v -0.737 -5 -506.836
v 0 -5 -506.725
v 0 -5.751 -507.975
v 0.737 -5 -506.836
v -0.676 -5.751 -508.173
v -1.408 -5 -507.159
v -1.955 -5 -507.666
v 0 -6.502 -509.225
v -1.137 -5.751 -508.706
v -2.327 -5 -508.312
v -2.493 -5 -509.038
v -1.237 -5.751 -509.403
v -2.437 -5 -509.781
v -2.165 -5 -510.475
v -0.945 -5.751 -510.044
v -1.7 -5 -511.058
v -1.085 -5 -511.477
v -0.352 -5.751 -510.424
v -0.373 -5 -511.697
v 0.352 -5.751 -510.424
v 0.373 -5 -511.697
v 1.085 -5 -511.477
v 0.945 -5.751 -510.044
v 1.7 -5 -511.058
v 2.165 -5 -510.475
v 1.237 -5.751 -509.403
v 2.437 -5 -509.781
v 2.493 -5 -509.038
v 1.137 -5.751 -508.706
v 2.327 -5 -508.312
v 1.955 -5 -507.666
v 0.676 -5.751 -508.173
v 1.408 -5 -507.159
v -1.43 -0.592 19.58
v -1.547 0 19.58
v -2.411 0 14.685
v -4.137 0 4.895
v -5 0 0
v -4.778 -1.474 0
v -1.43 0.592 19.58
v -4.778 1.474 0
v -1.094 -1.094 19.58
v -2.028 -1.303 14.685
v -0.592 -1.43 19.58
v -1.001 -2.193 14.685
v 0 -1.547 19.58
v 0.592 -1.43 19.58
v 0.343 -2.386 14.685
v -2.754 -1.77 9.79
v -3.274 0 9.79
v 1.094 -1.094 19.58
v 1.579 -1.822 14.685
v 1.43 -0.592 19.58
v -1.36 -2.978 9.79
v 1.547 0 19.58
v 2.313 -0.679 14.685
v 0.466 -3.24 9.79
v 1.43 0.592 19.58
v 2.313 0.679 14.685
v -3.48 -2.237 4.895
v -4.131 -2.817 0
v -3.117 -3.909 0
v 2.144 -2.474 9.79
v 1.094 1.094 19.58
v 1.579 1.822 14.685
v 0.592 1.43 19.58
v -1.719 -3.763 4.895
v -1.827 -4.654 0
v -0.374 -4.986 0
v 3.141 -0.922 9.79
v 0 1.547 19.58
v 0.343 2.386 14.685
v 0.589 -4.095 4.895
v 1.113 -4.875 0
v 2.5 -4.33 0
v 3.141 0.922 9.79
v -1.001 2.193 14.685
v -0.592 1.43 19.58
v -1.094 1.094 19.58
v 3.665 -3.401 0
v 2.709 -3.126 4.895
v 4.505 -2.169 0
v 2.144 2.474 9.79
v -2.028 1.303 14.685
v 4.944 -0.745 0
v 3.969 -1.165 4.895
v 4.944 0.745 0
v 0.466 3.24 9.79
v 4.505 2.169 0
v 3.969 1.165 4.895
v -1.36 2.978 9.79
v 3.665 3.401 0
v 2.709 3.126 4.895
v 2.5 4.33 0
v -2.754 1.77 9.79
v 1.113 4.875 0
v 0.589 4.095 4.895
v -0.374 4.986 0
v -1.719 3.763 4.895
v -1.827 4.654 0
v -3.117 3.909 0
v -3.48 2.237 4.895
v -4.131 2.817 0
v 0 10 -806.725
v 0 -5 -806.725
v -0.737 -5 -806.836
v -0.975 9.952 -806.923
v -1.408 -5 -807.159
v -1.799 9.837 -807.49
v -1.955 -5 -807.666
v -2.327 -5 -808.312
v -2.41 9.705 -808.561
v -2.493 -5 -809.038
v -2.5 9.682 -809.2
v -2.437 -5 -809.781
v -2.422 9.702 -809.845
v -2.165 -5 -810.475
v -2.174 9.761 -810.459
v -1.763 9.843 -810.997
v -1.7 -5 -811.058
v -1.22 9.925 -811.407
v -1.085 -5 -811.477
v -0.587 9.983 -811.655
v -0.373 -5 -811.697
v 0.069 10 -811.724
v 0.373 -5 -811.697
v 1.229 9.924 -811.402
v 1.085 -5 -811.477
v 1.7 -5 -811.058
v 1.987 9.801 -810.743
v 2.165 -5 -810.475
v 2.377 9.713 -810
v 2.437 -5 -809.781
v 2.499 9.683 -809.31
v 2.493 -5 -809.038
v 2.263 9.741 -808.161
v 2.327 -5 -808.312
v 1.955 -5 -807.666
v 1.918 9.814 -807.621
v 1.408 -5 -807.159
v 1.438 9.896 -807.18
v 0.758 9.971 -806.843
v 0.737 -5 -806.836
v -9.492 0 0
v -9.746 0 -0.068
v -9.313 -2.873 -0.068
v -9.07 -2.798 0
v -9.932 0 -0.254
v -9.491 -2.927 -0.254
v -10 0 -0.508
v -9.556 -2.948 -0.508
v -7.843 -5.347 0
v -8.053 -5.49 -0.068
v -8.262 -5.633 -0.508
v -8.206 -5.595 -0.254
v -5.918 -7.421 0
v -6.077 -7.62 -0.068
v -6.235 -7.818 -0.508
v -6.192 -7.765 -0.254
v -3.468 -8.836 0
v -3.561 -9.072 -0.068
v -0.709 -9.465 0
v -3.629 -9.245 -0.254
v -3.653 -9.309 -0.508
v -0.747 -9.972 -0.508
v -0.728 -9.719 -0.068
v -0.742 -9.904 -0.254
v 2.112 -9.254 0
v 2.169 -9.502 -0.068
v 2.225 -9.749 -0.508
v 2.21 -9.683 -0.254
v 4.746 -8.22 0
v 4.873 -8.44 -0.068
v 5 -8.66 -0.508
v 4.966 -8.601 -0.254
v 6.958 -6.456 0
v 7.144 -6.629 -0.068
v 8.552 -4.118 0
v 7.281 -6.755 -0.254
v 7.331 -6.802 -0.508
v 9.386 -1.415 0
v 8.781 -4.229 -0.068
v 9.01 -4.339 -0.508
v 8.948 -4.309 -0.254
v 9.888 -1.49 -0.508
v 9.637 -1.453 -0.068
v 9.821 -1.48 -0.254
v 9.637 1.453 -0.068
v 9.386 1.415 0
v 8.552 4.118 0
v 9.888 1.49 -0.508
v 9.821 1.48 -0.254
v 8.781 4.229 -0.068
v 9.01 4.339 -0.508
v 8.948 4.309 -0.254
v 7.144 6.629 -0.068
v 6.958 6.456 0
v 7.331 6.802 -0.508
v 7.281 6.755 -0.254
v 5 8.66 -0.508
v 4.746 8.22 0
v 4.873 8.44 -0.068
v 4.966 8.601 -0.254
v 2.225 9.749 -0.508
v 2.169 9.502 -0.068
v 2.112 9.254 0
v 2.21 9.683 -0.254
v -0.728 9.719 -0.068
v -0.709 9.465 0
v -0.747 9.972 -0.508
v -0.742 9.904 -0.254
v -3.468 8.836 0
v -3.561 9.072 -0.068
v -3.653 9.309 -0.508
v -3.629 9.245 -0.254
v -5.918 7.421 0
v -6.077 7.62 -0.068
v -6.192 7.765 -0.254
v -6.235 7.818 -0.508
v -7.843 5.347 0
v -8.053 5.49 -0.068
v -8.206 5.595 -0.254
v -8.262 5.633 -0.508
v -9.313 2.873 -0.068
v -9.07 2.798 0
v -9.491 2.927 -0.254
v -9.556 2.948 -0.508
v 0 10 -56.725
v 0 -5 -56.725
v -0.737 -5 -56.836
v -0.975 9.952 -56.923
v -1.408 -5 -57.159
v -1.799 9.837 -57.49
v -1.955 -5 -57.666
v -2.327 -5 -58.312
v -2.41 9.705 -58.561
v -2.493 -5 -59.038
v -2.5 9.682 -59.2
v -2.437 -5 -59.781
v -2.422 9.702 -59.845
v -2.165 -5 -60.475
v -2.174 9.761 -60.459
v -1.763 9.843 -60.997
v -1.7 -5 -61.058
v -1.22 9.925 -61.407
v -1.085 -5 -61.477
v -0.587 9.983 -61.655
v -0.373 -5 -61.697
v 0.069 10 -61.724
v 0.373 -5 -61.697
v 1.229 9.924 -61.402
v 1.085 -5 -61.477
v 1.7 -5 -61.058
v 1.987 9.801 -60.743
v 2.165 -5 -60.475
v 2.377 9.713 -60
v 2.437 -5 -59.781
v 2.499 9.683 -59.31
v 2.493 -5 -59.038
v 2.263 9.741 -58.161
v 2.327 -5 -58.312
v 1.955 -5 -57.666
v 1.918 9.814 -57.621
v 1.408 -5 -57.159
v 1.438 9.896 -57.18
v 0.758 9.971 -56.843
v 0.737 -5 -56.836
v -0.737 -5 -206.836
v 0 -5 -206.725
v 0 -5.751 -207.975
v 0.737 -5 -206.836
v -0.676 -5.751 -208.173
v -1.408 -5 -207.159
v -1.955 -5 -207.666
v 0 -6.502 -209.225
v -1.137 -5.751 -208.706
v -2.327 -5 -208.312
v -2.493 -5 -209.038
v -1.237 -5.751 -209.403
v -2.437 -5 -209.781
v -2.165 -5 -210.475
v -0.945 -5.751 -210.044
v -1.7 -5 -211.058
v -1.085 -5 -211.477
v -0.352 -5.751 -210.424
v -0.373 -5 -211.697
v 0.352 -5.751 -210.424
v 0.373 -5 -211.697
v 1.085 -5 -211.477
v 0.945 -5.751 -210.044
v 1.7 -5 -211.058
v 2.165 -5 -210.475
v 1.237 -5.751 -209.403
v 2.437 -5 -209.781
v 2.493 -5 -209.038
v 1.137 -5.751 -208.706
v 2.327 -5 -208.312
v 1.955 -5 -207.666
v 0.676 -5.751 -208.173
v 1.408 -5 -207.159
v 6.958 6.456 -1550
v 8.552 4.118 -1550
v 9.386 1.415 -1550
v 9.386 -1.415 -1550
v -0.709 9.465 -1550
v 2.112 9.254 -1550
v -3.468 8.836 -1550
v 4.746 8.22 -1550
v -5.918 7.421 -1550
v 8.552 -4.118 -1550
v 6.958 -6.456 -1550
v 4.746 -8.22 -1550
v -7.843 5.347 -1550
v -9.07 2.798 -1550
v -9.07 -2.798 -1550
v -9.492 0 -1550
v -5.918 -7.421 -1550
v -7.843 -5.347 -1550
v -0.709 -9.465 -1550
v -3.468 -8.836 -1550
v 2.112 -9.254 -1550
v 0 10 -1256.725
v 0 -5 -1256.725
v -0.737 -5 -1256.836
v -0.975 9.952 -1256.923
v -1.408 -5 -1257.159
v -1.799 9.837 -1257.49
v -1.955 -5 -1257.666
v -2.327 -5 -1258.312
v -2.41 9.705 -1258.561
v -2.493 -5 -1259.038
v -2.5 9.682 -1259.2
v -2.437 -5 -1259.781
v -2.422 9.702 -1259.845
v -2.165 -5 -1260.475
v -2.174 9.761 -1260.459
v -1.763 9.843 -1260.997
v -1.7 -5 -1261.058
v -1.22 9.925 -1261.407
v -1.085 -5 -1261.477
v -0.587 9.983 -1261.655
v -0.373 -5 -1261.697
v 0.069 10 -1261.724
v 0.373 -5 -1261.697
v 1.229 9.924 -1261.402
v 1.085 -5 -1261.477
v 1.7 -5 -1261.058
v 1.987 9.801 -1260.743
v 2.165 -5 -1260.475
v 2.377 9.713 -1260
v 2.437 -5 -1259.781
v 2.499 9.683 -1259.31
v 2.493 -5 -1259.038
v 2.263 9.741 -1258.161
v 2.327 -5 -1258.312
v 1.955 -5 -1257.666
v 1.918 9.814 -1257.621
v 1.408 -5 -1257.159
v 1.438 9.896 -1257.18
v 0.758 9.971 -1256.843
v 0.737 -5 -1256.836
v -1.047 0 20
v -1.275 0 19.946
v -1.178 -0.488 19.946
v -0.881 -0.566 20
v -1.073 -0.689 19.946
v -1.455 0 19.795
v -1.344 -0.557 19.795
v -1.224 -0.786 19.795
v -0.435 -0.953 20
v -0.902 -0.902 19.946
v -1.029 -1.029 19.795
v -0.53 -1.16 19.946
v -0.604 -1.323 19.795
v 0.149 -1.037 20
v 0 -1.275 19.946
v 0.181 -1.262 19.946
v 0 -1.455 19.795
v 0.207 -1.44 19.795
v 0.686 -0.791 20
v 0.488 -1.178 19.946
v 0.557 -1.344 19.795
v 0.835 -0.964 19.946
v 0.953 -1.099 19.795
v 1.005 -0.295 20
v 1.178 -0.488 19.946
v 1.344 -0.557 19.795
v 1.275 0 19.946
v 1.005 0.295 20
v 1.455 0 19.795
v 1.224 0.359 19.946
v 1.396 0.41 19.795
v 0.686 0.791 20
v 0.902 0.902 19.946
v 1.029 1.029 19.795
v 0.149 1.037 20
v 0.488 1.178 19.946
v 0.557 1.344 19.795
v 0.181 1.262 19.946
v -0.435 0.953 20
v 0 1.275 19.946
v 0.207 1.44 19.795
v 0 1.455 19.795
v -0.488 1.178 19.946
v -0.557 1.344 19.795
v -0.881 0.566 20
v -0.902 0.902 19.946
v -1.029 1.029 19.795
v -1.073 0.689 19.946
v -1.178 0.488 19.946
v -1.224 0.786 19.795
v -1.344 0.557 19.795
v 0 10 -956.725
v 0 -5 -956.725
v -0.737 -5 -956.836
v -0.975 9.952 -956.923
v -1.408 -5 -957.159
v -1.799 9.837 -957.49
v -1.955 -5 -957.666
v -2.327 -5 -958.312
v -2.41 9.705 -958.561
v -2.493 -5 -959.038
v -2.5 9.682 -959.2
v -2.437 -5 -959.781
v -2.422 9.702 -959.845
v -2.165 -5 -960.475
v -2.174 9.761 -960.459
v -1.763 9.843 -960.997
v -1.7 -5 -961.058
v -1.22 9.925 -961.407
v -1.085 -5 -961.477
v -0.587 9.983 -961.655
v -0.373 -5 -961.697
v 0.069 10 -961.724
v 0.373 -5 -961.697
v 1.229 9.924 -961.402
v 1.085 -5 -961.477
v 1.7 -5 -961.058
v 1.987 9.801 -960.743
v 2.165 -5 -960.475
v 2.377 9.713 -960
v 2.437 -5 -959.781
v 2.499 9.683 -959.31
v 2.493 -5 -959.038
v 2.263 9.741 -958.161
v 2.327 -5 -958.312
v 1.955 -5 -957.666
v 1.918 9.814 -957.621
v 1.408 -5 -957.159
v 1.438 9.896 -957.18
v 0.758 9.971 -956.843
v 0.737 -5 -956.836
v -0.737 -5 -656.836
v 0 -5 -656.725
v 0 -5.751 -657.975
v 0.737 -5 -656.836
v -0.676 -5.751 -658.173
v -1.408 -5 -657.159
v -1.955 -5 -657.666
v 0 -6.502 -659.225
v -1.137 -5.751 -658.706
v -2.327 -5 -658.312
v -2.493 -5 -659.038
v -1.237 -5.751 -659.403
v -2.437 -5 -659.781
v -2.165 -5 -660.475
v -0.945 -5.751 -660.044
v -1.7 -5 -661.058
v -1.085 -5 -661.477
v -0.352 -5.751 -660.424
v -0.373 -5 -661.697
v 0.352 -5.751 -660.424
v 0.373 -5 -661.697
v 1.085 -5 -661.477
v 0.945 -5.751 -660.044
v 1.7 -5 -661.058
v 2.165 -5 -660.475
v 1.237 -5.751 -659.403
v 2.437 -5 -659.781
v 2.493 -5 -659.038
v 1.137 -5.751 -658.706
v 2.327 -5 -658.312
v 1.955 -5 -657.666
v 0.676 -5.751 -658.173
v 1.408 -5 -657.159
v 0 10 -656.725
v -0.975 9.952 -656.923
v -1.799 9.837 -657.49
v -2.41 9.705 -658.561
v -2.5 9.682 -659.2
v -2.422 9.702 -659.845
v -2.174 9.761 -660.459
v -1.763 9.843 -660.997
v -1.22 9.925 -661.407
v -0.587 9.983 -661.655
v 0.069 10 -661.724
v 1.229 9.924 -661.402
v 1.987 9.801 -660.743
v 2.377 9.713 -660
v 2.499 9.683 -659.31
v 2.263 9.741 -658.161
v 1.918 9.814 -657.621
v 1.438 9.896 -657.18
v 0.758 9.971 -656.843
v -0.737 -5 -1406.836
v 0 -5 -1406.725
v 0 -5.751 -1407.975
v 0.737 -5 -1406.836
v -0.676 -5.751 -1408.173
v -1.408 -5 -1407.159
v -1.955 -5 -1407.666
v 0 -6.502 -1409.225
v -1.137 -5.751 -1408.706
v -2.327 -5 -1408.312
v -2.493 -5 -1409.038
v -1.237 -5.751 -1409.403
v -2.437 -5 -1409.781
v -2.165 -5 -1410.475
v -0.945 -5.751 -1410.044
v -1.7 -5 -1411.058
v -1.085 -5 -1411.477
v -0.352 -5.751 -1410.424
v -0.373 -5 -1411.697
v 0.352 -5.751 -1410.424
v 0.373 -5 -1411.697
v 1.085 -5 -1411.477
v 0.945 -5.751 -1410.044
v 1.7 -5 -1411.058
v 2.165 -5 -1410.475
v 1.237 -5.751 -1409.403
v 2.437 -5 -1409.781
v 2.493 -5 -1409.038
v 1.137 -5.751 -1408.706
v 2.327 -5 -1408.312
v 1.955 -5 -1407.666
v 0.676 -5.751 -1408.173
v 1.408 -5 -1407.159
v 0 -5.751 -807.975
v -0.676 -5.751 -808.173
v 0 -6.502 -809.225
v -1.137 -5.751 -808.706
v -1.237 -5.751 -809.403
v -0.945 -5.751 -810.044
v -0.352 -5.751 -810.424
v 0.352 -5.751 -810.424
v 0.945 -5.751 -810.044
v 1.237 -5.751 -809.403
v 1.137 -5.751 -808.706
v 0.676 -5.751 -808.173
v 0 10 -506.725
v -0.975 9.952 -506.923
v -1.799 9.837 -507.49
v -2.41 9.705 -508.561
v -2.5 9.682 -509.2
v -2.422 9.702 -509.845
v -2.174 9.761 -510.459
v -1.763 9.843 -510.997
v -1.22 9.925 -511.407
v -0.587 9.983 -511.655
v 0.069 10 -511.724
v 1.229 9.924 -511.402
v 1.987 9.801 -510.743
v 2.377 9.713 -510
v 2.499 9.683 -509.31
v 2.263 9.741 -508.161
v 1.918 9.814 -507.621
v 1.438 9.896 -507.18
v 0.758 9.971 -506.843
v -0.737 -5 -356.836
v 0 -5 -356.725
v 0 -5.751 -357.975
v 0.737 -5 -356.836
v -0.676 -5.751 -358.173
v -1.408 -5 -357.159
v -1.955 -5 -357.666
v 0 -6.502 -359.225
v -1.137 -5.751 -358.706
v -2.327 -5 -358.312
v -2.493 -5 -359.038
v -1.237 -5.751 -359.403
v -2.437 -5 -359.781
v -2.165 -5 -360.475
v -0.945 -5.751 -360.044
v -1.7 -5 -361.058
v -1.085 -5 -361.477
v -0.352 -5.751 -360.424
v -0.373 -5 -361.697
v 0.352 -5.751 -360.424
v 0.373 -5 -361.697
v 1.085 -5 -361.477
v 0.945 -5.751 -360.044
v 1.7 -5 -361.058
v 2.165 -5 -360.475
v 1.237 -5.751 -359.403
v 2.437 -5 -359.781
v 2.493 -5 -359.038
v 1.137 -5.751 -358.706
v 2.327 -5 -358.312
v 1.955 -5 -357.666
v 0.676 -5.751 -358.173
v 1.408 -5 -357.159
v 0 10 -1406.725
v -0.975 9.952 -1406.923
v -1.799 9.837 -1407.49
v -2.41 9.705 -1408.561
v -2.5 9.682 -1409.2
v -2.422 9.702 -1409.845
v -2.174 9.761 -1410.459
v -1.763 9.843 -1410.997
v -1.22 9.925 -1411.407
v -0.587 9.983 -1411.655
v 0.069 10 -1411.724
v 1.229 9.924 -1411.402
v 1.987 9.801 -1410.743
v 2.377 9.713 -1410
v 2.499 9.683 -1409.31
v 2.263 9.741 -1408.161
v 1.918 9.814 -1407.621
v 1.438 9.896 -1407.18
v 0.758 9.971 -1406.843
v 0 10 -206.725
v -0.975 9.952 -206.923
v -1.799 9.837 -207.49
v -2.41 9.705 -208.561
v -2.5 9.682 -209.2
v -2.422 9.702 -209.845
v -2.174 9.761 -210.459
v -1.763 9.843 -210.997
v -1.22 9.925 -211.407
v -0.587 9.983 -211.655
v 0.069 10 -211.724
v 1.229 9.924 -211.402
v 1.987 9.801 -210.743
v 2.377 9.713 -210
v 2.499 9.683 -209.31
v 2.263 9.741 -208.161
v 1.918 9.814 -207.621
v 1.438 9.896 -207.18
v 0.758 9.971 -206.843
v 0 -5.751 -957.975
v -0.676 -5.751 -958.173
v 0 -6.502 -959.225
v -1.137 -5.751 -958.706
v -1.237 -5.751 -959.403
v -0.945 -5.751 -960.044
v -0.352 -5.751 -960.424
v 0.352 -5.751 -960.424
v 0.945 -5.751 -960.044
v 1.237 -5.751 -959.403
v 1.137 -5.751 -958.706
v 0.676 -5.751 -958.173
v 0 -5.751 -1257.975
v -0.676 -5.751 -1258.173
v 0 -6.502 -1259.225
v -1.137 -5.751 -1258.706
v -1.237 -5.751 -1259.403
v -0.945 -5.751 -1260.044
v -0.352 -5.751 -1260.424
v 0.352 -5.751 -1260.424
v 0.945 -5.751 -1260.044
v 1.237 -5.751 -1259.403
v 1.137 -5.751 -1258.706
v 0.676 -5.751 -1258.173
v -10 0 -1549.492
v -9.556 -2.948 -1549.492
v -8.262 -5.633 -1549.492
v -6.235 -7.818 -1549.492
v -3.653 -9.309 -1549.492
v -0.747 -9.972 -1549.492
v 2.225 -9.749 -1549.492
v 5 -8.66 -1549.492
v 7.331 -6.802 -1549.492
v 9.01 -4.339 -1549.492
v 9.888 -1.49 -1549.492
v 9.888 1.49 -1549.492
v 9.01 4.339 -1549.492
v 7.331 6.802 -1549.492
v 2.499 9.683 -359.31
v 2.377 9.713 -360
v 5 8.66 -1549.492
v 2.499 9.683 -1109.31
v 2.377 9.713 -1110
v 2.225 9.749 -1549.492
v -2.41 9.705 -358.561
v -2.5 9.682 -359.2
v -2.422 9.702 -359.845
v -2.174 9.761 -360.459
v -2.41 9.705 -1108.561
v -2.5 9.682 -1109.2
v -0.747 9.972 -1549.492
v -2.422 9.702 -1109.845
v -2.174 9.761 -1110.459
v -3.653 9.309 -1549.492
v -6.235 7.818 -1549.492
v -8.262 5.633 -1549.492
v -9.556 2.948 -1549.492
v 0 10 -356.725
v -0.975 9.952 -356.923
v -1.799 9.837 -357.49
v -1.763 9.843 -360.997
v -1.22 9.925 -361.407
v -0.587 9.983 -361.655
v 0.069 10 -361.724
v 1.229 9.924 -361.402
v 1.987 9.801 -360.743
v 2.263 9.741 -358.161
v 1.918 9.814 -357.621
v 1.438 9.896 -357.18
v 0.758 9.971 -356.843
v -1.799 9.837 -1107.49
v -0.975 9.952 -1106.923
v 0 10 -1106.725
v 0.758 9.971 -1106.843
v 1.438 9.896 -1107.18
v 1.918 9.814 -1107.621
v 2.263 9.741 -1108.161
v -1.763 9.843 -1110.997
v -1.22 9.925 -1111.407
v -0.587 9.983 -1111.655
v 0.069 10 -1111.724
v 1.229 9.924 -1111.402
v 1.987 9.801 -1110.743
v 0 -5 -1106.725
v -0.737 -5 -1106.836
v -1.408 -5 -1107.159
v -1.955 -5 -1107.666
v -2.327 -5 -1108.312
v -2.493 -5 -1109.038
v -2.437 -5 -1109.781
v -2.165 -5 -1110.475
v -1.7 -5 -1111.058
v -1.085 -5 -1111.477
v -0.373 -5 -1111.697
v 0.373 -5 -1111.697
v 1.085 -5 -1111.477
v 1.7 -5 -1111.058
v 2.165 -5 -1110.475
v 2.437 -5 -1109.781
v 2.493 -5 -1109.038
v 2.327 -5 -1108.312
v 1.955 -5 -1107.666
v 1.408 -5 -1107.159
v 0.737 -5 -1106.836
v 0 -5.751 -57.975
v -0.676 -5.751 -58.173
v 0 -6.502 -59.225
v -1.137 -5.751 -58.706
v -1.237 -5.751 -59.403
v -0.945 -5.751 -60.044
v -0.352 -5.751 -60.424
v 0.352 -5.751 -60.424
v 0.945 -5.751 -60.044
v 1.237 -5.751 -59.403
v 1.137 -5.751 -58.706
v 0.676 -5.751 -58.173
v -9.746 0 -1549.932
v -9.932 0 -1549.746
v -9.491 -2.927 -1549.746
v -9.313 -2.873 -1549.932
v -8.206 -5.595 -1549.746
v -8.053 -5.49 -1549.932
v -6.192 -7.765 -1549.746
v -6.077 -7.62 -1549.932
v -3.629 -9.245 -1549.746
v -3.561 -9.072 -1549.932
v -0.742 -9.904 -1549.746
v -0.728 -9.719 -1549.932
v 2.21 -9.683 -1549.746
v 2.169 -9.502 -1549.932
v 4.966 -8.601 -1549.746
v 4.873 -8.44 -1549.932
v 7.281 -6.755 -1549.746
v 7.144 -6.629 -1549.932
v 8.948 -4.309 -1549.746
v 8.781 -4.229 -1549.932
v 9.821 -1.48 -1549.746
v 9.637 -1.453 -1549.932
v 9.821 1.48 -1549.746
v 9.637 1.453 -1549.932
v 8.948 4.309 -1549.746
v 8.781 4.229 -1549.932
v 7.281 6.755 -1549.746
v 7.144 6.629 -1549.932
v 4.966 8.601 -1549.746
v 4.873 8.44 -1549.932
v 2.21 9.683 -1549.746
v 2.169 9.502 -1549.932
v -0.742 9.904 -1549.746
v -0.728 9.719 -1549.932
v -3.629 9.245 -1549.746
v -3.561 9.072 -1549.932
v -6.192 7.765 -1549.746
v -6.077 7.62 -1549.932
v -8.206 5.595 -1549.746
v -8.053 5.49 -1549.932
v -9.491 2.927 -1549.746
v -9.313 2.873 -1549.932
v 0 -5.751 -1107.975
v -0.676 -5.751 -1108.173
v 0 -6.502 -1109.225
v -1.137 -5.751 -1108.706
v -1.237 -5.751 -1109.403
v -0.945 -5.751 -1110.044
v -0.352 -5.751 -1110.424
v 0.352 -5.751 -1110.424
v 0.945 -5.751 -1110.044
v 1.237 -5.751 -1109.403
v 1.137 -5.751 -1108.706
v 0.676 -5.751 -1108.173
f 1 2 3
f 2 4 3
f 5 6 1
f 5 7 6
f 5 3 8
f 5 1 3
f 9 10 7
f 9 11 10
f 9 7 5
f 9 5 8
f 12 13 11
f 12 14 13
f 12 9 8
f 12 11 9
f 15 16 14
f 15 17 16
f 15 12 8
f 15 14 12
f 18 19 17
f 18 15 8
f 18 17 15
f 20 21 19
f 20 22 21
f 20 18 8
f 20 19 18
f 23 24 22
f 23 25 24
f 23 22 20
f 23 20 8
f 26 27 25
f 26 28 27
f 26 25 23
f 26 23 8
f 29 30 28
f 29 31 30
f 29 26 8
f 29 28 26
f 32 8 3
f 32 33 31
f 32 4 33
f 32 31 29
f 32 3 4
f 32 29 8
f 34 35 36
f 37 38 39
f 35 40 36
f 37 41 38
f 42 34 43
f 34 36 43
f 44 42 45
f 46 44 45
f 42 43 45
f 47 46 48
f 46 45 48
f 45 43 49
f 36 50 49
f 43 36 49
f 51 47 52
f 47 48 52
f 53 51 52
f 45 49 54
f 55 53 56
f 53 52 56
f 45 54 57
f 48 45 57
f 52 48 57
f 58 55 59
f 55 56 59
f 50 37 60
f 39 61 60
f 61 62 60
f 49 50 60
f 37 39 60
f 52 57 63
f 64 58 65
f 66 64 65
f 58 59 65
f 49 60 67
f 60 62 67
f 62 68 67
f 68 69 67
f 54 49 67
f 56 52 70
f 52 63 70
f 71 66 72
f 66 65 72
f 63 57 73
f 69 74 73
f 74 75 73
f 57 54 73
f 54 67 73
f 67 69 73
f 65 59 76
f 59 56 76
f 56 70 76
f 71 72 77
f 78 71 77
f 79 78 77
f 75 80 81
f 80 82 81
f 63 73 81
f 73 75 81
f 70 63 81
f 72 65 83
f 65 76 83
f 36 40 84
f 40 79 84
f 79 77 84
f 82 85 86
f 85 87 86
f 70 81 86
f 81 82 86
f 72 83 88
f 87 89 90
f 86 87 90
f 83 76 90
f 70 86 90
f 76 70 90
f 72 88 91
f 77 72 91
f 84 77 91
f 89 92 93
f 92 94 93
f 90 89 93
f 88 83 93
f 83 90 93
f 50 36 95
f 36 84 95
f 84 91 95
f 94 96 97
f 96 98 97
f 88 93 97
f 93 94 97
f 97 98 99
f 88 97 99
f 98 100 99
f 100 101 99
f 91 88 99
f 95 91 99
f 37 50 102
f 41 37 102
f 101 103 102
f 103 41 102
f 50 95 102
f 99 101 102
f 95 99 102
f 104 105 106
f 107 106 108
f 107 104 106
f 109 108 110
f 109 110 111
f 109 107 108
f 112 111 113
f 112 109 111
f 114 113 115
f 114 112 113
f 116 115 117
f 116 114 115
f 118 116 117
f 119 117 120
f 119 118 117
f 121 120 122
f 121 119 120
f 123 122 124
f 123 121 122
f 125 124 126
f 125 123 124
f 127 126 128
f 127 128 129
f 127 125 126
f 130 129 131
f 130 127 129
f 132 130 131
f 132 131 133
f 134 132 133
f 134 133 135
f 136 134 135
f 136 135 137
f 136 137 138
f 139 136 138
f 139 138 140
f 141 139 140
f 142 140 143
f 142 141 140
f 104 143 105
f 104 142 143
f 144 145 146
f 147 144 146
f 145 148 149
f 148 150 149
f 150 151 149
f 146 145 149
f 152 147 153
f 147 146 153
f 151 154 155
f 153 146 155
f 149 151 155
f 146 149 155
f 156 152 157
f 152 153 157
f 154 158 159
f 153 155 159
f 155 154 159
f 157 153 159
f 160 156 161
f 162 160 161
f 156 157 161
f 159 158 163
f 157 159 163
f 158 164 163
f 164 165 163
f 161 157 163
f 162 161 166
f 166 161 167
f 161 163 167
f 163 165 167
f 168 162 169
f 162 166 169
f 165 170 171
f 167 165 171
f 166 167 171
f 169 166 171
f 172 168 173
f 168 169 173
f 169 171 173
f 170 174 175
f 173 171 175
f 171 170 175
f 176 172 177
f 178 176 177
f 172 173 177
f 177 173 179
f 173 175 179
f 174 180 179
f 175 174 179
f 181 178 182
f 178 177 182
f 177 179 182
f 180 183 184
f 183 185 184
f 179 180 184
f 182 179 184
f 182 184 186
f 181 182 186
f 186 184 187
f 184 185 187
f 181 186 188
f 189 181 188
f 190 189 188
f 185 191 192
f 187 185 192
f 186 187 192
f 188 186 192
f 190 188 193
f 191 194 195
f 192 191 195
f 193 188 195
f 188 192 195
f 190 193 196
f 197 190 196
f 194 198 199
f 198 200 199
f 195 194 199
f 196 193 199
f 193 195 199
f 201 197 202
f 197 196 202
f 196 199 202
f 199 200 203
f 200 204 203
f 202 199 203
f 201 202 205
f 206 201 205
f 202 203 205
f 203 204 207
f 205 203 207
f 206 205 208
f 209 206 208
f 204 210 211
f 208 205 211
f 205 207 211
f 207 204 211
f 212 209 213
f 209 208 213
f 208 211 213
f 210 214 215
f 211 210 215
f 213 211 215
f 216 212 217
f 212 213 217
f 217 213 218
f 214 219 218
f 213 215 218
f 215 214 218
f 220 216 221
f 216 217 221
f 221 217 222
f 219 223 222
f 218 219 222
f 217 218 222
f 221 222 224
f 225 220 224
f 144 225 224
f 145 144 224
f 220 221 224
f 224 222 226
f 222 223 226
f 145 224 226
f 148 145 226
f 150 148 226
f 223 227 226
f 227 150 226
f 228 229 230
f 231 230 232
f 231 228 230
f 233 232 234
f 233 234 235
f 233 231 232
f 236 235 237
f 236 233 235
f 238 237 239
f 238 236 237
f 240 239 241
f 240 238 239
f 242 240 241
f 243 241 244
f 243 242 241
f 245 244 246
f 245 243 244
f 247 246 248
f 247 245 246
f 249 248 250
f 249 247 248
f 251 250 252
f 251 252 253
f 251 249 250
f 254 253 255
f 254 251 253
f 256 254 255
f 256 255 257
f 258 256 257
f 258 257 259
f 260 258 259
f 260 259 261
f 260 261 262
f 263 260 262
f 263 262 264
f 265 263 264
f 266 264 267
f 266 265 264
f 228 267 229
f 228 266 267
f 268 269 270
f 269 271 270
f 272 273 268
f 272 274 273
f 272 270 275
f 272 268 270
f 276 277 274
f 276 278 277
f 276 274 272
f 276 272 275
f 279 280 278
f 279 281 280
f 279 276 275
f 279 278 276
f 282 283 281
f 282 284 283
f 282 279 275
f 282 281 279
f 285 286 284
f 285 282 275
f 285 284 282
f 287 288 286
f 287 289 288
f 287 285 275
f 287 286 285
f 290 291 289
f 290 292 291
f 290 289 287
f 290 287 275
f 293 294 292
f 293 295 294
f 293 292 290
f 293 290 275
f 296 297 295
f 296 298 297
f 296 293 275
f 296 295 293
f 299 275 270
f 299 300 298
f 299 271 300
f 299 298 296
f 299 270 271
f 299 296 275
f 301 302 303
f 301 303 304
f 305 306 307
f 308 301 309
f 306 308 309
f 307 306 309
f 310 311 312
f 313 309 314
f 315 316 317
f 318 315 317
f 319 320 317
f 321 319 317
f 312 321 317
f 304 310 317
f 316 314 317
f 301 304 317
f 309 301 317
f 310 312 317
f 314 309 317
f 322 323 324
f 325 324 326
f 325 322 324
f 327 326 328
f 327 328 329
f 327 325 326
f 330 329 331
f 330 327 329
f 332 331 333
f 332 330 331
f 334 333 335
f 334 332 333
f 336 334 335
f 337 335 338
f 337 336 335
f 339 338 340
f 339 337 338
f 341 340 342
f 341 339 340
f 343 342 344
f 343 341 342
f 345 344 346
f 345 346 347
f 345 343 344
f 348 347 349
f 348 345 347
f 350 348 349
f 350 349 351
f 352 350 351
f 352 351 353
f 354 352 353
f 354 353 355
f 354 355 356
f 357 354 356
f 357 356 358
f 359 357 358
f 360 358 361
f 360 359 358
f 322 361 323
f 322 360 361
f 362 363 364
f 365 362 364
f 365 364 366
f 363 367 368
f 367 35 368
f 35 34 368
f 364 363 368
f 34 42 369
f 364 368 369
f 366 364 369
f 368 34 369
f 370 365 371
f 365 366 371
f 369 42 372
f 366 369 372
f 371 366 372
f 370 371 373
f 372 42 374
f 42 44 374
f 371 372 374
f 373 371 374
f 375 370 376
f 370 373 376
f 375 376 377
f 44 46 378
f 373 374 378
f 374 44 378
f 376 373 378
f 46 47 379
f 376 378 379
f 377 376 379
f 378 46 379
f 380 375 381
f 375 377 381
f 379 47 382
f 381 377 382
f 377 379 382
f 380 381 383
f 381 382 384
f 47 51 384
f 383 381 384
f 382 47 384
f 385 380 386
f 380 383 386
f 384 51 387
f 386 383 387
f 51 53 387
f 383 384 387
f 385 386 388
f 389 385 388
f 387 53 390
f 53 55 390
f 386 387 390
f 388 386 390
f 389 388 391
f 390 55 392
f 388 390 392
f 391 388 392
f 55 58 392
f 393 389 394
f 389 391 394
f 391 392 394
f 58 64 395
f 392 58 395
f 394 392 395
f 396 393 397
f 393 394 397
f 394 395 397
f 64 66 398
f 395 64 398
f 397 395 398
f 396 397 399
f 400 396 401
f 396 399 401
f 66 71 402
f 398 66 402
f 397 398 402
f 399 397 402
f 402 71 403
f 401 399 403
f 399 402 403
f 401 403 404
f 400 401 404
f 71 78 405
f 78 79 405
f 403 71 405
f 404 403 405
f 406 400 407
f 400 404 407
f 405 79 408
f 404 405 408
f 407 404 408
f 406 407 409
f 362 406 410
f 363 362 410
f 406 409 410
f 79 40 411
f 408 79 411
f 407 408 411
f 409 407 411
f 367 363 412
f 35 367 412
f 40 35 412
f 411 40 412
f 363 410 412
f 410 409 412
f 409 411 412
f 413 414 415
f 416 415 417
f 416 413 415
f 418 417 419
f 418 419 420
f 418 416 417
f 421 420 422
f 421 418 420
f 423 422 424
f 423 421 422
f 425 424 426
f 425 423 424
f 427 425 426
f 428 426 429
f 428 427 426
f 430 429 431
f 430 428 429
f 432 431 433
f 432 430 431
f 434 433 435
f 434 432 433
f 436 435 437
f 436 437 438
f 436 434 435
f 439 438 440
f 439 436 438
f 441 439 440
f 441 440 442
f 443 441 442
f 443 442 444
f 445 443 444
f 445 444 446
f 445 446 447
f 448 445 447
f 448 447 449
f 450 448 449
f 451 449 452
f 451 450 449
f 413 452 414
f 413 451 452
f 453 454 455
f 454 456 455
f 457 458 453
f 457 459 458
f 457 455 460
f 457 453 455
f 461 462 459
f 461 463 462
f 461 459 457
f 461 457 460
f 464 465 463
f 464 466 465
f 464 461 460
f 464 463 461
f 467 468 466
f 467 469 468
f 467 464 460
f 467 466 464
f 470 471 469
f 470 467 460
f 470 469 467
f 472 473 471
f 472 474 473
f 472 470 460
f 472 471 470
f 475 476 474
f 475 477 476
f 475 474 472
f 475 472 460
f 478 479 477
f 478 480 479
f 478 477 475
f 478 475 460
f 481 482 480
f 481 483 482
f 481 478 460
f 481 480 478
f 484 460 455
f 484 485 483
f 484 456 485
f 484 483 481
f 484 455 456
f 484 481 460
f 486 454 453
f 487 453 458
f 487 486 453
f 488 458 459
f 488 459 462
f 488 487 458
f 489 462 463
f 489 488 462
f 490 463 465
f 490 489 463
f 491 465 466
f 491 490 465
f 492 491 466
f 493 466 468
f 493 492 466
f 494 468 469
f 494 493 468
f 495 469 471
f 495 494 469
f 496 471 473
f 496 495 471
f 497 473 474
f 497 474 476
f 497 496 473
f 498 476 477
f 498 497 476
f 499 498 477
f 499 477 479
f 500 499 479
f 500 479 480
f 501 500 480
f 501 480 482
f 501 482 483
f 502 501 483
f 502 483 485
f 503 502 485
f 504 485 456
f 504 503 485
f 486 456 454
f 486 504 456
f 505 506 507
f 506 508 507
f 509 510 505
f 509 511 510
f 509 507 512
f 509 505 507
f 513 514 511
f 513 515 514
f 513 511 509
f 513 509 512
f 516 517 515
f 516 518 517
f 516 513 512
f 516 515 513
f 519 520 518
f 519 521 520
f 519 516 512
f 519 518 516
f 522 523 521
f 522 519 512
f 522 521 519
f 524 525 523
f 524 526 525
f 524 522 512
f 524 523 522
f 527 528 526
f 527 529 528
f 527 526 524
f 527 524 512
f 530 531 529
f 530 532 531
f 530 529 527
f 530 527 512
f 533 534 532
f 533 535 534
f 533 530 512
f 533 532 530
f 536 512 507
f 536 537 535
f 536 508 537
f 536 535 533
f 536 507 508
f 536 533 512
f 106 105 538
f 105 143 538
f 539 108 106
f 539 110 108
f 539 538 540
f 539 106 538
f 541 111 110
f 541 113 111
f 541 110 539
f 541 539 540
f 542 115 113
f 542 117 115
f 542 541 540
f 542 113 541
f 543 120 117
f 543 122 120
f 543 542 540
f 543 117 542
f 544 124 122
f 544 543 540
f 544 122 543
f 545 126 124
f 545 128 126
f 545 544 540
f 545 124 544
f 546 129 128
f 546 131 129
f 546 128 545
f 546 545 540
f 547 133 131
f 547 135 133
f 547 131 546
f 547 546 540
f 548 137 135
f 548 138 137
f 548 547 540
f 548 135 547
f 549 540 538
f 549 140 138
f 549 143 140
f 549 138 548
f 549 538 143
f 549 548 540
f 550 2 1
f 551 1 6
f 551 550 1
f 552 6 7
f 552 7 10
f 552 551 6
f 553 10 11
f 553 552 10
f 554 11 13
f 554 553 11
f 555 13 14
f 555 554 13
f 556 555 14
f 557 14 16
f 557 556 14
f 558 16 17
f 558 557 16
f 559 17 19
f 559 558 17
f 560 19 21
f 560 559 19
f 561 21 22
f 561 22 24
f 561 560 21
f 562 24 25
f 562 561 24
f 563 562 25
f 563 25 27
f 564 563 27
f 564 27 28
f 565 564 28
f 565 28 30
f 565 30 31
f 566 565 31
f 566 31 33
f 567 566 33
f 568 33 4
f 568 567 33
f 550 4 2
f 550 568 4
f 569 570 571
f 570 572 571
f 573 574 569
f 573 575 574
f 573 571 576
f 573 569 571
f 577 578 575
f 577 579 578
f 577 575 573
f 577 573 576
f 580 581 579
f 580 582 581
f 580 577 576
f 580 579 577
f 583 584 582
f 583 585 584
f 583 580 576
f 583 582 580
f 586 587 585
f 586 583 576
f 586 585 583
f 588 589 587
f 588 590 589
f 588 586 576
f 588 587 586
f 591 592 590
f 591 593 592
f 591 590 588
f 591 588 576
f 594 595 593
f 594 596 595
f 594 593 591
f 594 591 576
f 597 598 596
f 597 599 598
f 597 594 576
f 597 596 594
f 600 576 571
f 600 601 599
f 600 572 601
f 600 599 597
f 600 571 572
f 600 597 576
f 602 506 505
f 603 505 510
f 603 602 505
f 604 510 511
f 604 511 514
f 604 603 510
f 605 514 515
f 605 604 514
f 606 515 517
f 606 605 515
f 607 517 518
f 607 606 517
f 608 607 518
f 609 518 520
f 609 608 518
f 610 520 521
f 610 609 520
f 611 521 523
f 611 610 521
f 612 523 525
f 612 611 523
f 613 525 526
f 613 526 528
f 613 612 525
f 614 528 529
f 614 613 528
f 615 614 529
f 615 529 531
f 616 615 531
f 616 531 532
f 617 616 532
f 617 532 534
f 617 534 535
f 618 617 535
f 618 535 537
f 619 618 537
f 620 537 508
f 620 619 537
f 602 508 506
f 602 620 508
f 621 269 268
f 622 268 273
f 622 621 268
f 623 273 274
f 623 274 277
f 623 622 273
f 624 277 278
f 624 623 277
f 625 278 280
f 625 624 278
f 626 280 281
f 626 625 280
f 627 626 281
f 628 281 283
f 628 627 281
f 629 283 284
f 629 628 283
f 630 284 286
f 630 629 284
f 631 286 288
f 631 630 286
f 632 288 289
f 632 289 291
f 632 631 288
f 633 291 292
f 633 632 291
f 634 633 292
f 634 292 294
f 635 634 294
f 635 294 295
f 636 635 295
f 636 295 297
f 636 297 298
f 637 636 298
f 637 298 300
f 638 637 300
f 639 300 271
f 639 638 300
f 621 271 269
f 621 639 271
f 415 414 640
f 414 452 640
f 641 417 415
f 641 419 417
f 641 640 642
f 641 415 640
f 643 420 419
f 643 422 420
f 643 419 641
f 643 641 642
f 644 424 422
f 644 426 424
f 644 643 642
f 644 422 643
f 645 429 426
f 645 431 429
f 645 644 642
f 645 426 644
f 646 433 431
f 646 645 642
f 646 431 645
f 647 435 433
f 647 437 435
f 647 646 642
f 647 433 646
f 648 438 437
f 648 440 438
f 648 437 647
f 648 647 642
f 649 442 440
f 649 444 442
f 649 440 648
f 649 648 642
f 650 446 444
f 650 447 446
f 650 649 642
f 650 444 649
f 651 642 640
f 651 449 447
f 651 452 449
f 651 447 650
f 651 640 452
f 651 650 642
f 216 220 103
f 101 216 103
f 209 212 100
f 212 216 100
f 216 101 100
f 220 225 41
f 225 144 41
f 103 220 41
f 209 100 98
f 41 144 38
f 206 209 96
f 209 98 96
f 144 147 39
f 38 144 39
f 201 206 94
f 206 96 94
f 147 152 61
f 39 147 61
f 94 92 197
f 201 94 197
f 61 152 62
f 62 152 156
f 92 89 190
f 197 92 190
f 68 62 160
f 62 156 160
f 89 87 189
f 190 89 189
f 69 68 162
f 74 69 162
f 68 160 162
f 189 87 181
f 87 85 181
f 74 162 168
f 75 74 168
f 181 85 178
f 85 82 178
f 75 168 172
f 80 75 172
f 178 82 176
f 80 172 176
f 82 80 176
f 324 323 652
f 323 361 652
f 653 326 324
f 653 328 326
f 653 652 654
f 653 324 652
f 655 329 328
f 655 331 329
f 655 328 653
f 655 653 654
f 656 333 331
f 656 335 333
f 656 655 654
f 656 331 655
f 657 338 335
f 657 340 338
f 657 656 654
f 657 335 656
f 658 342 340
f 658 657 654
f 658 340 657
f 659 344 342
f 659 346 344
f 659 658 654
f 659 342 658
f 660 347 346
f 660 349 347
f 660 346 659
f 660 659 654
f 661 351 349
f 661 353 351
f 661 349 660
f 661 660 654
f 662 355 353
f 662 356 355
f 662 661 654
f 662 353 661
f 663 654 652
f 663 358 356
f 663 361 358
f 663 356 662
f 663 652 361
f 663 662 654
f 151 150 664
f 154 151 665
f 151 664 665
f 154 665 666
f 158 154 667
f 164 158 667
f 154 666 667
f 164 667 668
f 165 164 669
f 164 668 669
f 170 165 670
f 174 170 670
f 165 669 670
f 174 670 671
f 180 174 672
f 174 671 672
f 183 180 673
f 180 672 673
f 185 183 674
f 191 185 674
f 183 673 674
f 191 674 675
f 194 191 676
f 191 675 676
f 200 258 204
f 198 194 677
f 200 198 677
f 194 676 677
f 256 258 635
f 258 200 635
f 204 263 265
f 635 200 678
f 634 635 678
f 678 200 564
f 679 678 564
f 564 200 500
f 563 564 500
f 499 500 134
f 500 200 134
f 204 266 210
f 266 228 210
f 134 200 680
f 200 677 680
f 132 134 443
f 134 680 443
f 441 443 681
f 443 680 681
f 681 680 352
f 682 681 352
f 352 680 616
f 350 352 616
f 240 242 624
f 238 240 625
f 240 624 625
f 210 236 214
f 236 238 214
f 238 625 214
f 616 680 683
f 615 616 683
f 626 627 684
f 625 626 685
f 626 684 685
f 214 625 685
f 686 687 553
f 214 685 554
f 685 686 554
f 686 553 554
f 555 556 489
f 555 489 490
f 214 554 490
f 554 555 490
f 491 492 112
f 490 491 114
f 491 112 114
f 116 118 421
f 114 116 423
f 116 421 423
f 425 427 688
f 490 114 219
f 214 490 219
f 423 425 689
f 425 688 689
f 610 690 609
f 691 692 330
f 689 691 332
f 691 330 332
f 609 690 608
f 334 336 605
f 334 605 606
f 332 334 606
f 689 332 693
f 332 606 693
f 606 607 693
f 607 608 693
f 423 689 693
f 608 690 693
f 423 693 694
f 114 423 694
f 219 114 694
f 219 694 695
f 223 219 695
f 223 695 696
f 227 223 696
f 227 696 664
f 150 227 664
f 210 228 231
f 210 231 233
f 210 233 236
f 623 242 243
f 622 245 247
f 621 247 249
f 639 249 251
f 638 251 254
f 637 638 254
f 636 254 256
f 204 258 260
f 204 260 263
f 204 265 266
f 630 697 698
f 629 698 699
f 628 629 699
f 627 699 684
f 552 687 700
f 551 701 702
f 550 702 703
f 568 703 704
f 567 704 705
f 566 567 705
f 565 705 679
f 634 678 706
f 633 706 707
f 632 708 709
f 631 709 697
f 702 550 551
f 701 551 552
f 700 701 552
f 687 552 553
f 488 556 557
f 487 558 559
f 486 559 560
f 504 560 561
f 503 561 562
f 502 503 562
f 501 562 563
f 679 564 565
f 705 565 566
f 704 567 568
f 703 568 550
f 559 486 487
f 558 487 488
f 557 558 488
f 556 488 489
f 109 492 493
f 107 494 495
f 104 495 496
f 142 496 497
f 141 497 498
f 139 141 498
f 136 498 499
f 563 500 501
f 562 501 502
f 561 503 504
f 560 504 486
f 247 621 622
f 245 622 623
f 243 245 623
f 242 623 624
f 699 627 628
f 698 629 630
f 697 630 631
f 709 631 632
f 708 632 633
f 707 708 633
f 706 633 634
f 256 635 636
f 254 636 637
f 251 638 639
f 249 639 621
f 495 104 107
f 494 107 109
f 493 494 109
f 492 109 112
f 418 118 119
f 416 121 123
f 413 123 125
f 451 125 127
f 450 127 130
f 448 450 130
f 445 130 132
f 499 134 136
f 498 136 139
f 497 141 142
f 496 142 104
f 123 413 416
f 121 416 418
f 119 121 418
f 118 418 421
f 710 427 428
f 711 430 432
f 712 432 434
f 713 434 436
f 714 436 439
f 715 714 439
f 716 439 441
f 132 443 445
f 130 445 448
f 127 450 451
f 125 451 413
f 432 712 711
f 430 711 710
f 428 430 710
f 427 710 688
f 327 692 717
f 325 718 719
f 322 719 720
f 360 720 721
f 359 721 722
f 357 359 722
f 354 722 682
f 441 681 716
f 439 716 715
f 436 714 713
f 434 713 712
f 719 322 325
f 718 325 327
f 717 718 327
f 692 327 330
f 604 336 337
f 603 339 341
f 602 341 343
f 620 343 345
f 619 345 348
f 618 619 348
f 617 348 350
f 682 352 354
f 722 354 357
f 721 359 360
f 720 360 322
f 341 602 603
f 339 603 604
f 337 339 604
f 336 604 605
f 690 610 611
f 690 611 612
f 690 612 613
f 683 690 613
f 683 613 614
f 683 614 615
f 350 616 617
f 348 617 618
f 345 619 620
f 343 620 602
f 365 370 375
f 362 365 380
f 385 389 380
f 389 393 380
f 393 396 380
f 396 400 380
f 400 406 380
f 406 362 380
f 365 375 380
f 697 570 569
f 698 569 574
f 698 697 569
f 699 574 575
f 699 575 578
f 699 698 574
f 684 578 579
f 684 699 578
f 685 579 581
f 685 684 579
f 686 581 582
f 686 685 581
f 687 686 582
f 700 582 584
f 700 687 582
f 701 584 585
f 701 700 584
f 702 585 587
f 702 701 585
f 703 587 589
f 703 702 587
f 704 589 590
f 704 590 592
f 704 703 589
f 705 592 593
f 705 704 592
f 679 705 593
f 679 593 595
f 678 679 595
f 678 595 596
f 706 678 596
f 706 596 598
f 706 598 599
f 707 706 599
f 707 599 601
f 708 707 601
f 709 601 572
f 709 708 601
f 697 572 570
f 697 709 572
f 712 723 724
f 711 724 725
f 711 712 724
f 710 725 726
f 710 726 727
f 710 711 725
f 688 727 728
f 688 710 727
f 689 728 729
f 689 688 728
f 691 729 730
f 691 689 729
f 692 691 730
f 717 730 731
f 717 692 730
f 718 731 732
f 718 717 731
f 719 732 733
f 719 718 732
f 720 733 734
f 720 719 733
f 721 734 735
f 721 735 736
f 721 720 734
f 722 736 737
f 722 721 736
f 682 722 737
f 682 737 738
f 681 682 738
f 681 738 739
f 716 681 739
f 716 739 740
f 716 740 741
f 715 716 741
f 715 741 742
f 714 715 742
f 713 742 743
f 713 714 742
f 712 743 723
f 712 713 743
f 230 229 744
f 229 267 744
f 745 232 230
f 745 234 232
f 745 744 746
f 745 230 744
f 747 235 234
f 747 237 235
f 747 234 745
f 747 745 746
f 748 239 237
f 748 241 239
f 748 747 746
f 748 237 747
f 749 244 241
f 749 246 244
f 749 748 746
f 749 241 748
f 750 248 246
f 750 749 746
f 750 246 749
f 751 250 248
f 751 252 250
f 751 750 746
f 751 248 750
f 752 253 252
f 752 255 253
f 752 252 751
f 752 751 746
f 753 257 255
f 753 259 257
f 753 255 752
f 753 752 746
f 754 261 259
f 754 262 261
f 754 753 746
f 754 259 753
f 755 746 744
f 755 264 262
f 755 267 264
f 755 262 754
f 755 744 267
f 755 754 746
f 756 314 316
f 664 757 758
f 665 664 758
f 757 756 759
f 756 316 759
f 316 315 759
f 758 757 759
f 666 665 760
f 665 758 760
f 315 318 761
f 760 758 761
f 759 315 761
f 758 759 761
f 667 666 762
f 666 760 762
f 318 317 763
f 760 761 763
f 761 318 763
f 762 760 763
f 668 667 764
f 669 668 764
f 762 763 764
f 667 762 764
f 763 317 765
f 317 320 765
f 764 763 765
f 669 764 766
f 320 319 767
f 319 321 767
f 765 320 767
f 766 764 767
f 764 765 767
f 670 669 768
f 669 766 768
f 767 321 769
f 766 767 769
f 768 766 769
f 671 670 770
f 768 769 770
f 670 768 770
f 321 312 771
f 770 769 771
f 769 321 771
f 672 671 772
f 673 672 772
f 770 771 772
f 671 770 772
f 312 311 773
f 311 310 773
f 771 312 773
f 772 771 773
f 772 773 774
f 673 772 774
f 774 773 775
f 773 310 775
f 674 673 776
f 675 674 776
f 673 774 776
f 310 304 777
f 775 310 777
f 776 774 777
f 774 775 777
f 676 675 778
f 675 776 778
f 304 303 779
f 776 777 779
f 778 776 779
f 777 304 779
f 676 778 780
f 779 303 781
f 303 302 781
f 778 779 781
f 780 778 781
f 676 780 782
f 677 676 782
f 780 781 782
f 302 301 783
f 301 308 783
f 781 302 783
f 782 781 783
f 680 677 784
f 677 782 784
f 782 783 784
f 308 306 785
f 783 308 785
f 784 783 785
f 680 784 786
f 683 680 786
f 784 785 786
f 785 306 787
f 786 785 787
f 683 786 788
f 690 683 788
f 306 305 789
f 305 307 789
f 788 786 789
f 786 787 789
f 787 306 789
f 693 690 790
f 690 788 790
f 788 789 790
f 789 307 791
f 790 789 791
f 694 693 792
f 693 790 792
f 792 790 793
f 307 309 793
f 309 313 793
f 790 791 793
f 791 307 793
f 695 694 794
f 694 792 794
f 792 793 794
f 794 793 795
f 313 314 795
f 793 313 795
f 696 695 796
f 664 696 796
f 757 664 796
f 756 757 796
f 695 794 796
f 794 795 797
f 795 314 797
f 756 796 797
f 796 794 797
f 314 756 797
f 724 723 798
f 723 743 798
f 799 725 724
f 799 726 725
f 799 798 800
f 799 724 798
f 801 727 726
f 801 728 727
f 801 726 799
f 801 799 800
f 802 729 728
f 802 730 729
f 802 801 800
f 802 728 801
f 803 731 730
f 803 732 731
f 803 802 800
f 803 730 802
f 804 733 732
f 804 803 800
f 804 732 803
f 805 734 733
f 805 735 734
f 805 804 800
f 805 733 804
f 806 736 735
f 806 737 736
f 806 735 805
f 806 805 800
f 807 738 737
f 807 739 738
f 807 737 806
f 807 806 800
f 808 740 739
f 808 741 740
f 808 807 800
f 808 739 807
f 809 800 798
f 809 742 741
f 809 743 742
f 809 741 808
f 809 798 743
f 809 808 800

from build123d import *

# Parameters (mm, degrees)
FILLET1_R           = 0.508
LPATTERN1_COUNT     = 8
LPATTERN1_PITCH     = 150
LPATTERN1_COL_COUNT = 3
LPATTERN1_COL_PITCH = 150


with BuildPart() as part:
    # Sketch1 → Revolve1 (revolve)
    with BuildSketch(Plane(origin=(0, 0, 0), x_dir=(1, 0, 0), z_dir=(0, 1, 0)), mode=Mode.PRIVATE) as revolve1_sk:
        Polygon((0, 1550), (0, -20), (1.473460386, -20), (5, 0), (10, 0), (10, 1550), align=None)
    revolve(revolve1_sk.sketch.rotate(Axis((0, 0, -1550), (0, 0, 1)), 180), axis=Axis((0, 0, -1550), (0, 0, 1)))  # turned: the seam where the file's is

    # Fillet1
    fillet1_edges = [part.edges().sort_by_distance(p)[0] for p in [
        (10, 0, -1550),
        (10, 0, 0),
        (1.473460386, 0, 20),
    ]]
    fillet(fillet1_edges, radius=FILLET1_R)

    # Sketch3 → M6x1.0 Tapped Hole1 (revolve, cut)
    with BuildSketch(Plane(origin=(0, 10, -1109.22499992), x_dir=(0, 0, 1), z_dir=(1, 0, 0))):
        Polygon((0, 0), (0, 16.502151548), (2.5, 15), (2.5, 0), align=None)
    m6x1_0_tapped_hole1 = revolve(axis=Axis((0, 16.35, -1109.22499992), (0, -1, 0)), mode=Mode.SUBTRACT)

    # LPattern1: M6x1.0 Tapped Hole1 ×8
    with Locations(*[(0, 0, i * LPATTERN1_PITCH) for i in range(1, LPATTERN1_COUNT)]):
        add(m6x1_0_tapped_hole1, mode=Mode.SUBTRACT)

    # LPattern1 col: M6x1.0 Tapped Hole1 ×3
    with Locations(*[(0, 0, -i * LPATTERN1_COL_PITCH) for i in range(1, LPATTERN1_COL_COUNT)]):
        add(m6x1_0_tapped_hole1, mode=Mode.SUBTRACT)


solid = part.part
